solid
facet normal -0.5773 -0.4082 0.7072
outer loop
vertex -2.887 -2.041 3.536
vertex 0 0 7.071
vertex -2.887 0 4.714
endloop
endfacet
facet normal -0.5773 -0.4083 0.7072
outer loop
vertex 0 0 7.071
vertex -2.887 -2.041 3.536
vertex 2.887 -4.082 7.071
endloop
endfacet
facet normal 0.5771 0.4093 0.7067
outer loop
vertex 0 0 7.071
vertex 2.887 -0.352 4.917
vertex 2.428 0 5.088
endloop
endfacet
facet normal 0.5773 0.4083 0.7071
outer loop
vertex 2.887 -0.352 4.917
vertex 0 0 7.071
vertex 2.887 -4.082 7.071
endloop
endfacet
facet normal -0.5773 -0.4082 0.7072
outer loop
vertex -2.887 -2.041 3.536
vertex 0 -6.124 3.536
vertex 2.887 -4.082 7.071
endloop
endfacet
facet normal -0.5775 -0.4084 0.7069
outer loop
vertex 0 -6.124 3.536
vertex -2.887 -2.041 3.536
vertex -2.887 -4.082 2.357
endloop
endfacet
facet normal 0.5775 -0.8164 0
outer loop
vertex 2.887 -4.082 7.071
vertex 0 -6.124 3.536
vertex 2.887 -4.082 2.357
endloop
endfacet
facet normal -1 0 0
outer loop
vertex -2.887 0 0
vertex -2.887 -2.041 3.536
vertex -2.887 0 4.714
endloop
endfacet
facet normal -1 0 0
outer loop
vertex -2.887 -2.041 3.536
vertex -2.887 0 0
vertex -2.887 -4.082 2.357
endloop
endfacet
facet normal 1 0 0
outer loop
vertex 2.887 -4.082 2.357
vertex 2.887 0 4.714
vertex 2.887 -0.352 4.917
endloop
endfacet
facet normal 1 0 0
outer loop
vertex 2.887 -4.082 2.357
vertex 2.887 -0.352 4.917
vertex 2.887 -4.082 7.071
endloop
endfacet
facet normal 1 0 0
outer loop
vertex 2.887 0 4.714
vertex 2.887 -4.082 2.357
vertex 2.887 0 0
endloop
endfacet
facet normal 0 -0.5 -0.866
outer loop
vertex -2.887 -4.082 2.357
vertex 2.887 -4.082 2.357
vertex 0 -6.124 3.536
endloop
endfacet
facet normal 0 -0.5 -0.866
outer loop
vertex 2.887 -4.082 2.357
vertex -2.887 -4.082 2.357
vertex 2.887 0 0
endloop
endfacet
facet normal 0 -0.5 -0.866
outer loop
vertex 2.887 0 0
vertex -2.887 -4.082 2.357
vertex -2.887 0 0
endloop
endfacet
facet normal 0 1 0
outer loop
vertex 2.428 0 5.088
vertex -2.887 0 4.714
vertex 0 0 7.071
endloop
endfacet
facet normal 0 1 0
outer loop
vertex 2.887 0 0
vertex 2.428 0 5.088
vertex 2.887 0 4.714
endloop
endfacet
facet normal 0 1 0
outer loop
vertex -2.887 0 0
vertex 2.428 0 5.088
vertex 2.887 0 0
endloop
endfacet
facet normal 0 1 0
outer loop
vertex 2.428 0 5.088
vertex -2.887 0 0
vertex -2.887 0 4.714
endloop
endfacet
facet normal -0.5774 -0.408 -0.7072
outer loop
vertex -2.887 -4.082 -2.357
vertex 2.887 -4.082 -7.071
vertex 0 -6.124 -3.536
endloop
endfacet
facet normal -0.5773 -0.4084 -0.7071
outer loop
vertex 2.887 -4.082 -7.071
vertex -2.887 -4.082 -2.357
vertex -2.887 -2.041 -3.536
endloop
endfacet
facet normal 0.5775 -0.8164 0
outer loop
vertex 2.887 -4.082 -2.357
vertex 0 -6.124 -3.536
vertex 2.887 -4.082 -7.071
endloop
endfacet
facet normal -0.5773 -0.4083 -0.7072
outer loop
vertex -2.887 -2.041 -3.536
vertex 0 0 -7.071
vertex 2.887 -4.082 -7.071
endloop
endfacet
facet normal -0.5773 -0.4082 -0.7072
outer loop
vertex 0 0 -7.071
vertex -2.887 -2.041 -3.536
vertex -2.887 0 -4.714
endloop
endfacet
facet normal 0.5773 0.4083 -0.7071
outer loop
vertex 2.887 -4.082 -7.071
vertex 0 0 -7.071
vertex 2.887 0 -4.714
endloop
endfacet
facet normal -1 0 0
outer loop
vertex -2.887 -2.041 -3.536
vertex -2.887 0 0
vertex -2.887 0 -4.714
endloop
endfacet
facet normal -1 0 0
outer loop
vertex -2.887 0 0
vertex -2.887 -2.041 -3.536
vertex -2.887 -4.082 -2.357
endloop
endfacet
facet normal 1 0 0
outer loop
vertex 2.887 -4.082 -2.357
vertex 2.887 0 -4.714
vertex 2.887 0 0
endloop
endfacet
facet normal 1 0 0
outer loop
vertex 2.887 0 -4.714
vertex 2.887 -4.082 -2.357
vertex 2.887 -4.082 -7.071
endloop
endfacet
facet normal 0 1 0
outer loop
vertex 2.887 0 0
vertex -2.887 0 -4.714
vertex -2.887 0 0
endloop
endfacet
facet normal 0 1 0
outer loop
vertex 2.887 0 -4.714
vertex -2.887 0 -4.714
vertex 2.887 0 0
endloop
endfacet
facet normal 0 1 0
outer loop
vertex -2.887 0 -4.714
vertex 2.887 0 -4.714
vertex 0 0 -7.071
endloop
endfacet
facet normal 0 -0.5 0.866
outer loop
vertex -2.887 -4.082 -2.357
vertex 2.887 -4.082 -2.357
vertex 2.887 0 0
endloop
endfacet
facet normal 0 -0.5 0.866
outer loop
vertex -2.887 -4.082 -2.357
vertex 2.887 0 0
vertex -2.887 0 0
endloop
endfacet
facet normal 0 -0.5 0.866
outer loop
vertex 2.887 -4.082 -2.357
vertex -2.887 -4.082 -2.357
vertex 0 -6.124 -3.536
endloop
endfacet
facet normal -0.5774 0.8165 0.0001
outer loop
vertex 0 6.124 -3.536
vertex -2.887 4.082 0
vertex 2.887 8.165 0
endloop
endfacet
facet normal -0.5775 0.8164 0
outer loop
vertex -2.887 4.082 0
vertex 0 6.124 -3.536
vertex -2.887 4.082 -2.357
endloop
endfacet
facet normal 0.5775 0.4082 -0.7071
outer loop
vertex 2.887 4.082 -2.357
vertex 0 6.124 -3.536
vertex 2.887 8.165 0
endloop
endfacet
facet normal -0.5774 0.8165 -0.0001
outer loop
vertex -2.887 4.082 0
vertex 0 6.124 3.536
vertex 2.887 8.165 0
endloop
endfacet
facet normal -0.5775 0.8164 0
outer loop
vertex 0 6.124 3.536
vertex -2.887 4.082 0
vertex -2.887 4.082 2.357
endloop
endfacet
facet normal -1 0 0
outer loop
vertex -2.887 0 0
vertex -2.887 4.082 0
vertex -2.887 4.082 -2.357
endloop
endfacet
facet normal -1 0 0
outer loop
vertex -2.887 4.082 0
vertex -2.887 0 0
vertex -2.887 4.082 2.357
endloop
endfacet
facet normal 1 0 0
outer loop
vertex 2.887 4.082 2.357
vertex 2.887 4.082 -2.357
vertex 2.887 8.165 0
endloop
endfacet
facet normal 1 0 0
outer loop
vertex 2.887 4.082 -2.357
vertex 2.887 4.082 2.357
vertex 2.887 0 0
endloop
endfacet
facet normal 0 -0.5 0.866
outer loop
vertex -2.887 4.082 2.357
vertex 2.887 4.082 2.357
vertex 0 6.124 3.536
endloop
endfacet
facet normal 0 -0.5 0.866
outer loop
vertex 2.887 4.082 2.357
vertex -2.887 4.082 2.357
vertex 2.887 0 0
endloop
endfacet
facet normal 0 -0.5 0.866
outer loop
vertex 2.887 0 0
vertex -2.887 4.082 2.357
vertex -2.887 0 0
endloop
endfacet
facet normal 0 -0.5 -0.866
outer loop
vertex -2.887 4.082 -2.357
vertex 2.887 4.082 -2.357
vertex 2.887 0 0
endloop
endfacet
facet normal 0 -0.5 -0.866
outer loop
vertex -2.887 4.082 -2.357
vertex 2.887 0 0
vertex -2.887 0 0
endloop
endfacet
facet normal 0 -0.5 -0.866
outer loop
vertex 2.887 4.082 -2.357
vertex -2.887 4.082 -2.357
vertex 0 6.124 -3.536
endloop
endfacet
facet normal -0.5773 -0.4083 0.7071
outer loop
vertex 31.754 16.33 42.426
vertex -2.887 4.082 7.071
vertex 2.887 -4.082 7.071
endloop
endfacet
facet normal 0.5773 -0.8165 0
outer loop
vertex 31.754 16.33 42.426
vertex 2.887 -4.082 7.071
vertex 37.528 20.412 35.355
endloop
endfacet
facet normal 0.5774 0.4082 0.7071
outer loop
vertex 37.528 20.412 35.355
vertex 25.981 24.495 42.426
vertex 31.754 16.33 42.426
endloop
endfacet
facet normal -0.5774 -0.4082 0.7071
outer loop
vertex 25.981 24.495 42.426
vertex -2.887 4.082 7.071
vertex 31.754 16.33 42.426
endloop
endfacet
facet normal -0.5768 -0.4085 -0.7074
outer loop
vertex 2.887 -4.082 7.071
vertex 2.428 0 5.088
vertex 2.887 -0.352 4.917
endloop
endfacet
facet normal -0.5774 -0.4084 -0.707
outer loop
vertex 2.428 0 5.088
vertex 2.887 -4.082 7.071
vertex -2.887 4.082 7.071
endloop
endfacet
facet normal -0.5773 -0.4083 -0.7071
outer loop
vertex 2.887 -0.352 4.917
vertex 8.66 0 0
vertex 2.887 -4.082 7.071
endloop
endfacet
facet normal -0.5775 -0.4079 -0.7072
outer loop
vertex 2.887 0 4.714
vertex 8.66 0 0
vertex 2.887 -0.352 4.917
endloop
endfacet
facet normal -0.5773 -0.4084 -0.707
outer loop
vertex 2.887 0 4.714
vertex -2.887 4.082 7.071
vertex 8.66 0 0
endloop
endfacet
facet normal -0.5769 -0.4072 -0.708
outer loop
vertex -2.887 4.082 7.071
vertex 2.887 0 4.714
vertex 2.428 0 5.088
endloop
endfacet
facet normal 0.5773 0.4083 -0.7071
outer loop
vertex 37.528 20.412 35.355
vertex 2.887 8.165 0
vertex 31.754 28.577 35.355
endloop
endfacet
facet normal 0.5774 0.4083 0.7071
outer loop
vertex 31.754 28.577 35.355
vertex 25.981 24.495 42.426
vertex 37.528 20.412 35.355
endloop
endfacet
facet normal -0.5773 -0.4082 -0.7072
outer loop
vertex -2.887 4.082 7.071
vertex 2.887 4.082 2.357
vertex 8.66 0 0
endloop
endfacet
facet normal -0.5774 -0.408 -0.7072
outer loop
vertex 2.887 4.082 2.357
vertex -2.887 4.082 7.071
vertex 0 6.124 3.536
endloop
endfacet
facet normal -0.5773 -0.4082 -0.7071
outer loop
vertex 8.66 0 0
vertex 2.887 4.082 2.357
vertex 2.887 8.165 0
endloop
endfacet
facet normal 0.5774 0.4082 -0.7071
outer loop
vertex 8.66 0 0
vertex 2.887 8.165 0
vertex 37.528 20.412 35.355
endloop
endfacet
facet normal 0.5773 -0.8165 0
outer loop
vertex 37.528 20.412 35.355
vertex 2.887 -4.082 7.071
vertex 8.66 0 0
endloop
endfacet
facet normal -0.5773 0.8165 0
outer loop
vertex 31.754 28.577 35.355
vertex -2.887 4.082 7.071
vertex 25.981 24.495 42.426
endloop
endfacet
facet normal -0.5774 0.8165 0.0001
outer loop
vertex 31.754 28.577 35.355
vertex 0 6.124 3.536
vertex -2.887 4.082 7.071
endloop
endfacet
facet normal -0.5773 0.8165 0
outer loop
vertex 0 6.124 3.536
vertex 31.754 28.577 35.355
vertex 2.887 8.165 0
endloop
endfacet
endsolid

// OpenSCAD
// OpenSCAD 为免费开源的跨平台建模软件
// 作者：上海市第三女子初级中学 谢丁

a = 10; // 立方体的边长
e = 0.0; // 咬合面距离调整，数值越小，咬合精度越高
length = norm([a, a, a]); // 欧氏距离
b = acos(a / length); // 倾斜角
c = atan2(a, a);    // 方位角

for (i = [1:3]) // 循环三次
{
  rotate([i * 120, 0, 0]) // 每隔120°生成一个正三棱柱结构
  intersection() // 相交布尔运算
  {
    difference() // 相减布尔运算
    {
      rotate([0, -c, 90 - b]) cube([a, a, a], center = true); // 原始立方体
      translate([-length / 3, 0, 0]) cube([sqrt(3)*a / 3, sqrt(3)*a, sqrt(3)*a], center = true); // 左侧的立方体结构
      translate([length / 3, 0, 0]) cube([sqrt(3)*a / 3, sqrt(3)*a, sqrt(3)*a], center = true); // 右侧的立方体结构
    }
    // 正三棱柱结构
    translate([0, sqrt(3)*a / 2 + e, 0]) rotate([30, 0, 0]) rotate([0, 90, 0]) cylinder(h = sqrt(3) * a / 3, r = sqrt(3) * a / 2, $fn = 3, center = true);
  }
}
// 接触面榫头基座
% intersection()
{
  rotate([0, -c, 90 - b]) cube([a, a, a], center = true);
  translate([length / 3, 0, 0]) cube([sqrt(3)*a / 3, sqrt(3)*a, sqrt(3)*a], center = true);
}
# translate([sqrt(3)*a / 2, 0, 0]) rotate([0, -c, 90 - b]) cube([5 * a, a, a], center = false); // 5*a 为柄长
